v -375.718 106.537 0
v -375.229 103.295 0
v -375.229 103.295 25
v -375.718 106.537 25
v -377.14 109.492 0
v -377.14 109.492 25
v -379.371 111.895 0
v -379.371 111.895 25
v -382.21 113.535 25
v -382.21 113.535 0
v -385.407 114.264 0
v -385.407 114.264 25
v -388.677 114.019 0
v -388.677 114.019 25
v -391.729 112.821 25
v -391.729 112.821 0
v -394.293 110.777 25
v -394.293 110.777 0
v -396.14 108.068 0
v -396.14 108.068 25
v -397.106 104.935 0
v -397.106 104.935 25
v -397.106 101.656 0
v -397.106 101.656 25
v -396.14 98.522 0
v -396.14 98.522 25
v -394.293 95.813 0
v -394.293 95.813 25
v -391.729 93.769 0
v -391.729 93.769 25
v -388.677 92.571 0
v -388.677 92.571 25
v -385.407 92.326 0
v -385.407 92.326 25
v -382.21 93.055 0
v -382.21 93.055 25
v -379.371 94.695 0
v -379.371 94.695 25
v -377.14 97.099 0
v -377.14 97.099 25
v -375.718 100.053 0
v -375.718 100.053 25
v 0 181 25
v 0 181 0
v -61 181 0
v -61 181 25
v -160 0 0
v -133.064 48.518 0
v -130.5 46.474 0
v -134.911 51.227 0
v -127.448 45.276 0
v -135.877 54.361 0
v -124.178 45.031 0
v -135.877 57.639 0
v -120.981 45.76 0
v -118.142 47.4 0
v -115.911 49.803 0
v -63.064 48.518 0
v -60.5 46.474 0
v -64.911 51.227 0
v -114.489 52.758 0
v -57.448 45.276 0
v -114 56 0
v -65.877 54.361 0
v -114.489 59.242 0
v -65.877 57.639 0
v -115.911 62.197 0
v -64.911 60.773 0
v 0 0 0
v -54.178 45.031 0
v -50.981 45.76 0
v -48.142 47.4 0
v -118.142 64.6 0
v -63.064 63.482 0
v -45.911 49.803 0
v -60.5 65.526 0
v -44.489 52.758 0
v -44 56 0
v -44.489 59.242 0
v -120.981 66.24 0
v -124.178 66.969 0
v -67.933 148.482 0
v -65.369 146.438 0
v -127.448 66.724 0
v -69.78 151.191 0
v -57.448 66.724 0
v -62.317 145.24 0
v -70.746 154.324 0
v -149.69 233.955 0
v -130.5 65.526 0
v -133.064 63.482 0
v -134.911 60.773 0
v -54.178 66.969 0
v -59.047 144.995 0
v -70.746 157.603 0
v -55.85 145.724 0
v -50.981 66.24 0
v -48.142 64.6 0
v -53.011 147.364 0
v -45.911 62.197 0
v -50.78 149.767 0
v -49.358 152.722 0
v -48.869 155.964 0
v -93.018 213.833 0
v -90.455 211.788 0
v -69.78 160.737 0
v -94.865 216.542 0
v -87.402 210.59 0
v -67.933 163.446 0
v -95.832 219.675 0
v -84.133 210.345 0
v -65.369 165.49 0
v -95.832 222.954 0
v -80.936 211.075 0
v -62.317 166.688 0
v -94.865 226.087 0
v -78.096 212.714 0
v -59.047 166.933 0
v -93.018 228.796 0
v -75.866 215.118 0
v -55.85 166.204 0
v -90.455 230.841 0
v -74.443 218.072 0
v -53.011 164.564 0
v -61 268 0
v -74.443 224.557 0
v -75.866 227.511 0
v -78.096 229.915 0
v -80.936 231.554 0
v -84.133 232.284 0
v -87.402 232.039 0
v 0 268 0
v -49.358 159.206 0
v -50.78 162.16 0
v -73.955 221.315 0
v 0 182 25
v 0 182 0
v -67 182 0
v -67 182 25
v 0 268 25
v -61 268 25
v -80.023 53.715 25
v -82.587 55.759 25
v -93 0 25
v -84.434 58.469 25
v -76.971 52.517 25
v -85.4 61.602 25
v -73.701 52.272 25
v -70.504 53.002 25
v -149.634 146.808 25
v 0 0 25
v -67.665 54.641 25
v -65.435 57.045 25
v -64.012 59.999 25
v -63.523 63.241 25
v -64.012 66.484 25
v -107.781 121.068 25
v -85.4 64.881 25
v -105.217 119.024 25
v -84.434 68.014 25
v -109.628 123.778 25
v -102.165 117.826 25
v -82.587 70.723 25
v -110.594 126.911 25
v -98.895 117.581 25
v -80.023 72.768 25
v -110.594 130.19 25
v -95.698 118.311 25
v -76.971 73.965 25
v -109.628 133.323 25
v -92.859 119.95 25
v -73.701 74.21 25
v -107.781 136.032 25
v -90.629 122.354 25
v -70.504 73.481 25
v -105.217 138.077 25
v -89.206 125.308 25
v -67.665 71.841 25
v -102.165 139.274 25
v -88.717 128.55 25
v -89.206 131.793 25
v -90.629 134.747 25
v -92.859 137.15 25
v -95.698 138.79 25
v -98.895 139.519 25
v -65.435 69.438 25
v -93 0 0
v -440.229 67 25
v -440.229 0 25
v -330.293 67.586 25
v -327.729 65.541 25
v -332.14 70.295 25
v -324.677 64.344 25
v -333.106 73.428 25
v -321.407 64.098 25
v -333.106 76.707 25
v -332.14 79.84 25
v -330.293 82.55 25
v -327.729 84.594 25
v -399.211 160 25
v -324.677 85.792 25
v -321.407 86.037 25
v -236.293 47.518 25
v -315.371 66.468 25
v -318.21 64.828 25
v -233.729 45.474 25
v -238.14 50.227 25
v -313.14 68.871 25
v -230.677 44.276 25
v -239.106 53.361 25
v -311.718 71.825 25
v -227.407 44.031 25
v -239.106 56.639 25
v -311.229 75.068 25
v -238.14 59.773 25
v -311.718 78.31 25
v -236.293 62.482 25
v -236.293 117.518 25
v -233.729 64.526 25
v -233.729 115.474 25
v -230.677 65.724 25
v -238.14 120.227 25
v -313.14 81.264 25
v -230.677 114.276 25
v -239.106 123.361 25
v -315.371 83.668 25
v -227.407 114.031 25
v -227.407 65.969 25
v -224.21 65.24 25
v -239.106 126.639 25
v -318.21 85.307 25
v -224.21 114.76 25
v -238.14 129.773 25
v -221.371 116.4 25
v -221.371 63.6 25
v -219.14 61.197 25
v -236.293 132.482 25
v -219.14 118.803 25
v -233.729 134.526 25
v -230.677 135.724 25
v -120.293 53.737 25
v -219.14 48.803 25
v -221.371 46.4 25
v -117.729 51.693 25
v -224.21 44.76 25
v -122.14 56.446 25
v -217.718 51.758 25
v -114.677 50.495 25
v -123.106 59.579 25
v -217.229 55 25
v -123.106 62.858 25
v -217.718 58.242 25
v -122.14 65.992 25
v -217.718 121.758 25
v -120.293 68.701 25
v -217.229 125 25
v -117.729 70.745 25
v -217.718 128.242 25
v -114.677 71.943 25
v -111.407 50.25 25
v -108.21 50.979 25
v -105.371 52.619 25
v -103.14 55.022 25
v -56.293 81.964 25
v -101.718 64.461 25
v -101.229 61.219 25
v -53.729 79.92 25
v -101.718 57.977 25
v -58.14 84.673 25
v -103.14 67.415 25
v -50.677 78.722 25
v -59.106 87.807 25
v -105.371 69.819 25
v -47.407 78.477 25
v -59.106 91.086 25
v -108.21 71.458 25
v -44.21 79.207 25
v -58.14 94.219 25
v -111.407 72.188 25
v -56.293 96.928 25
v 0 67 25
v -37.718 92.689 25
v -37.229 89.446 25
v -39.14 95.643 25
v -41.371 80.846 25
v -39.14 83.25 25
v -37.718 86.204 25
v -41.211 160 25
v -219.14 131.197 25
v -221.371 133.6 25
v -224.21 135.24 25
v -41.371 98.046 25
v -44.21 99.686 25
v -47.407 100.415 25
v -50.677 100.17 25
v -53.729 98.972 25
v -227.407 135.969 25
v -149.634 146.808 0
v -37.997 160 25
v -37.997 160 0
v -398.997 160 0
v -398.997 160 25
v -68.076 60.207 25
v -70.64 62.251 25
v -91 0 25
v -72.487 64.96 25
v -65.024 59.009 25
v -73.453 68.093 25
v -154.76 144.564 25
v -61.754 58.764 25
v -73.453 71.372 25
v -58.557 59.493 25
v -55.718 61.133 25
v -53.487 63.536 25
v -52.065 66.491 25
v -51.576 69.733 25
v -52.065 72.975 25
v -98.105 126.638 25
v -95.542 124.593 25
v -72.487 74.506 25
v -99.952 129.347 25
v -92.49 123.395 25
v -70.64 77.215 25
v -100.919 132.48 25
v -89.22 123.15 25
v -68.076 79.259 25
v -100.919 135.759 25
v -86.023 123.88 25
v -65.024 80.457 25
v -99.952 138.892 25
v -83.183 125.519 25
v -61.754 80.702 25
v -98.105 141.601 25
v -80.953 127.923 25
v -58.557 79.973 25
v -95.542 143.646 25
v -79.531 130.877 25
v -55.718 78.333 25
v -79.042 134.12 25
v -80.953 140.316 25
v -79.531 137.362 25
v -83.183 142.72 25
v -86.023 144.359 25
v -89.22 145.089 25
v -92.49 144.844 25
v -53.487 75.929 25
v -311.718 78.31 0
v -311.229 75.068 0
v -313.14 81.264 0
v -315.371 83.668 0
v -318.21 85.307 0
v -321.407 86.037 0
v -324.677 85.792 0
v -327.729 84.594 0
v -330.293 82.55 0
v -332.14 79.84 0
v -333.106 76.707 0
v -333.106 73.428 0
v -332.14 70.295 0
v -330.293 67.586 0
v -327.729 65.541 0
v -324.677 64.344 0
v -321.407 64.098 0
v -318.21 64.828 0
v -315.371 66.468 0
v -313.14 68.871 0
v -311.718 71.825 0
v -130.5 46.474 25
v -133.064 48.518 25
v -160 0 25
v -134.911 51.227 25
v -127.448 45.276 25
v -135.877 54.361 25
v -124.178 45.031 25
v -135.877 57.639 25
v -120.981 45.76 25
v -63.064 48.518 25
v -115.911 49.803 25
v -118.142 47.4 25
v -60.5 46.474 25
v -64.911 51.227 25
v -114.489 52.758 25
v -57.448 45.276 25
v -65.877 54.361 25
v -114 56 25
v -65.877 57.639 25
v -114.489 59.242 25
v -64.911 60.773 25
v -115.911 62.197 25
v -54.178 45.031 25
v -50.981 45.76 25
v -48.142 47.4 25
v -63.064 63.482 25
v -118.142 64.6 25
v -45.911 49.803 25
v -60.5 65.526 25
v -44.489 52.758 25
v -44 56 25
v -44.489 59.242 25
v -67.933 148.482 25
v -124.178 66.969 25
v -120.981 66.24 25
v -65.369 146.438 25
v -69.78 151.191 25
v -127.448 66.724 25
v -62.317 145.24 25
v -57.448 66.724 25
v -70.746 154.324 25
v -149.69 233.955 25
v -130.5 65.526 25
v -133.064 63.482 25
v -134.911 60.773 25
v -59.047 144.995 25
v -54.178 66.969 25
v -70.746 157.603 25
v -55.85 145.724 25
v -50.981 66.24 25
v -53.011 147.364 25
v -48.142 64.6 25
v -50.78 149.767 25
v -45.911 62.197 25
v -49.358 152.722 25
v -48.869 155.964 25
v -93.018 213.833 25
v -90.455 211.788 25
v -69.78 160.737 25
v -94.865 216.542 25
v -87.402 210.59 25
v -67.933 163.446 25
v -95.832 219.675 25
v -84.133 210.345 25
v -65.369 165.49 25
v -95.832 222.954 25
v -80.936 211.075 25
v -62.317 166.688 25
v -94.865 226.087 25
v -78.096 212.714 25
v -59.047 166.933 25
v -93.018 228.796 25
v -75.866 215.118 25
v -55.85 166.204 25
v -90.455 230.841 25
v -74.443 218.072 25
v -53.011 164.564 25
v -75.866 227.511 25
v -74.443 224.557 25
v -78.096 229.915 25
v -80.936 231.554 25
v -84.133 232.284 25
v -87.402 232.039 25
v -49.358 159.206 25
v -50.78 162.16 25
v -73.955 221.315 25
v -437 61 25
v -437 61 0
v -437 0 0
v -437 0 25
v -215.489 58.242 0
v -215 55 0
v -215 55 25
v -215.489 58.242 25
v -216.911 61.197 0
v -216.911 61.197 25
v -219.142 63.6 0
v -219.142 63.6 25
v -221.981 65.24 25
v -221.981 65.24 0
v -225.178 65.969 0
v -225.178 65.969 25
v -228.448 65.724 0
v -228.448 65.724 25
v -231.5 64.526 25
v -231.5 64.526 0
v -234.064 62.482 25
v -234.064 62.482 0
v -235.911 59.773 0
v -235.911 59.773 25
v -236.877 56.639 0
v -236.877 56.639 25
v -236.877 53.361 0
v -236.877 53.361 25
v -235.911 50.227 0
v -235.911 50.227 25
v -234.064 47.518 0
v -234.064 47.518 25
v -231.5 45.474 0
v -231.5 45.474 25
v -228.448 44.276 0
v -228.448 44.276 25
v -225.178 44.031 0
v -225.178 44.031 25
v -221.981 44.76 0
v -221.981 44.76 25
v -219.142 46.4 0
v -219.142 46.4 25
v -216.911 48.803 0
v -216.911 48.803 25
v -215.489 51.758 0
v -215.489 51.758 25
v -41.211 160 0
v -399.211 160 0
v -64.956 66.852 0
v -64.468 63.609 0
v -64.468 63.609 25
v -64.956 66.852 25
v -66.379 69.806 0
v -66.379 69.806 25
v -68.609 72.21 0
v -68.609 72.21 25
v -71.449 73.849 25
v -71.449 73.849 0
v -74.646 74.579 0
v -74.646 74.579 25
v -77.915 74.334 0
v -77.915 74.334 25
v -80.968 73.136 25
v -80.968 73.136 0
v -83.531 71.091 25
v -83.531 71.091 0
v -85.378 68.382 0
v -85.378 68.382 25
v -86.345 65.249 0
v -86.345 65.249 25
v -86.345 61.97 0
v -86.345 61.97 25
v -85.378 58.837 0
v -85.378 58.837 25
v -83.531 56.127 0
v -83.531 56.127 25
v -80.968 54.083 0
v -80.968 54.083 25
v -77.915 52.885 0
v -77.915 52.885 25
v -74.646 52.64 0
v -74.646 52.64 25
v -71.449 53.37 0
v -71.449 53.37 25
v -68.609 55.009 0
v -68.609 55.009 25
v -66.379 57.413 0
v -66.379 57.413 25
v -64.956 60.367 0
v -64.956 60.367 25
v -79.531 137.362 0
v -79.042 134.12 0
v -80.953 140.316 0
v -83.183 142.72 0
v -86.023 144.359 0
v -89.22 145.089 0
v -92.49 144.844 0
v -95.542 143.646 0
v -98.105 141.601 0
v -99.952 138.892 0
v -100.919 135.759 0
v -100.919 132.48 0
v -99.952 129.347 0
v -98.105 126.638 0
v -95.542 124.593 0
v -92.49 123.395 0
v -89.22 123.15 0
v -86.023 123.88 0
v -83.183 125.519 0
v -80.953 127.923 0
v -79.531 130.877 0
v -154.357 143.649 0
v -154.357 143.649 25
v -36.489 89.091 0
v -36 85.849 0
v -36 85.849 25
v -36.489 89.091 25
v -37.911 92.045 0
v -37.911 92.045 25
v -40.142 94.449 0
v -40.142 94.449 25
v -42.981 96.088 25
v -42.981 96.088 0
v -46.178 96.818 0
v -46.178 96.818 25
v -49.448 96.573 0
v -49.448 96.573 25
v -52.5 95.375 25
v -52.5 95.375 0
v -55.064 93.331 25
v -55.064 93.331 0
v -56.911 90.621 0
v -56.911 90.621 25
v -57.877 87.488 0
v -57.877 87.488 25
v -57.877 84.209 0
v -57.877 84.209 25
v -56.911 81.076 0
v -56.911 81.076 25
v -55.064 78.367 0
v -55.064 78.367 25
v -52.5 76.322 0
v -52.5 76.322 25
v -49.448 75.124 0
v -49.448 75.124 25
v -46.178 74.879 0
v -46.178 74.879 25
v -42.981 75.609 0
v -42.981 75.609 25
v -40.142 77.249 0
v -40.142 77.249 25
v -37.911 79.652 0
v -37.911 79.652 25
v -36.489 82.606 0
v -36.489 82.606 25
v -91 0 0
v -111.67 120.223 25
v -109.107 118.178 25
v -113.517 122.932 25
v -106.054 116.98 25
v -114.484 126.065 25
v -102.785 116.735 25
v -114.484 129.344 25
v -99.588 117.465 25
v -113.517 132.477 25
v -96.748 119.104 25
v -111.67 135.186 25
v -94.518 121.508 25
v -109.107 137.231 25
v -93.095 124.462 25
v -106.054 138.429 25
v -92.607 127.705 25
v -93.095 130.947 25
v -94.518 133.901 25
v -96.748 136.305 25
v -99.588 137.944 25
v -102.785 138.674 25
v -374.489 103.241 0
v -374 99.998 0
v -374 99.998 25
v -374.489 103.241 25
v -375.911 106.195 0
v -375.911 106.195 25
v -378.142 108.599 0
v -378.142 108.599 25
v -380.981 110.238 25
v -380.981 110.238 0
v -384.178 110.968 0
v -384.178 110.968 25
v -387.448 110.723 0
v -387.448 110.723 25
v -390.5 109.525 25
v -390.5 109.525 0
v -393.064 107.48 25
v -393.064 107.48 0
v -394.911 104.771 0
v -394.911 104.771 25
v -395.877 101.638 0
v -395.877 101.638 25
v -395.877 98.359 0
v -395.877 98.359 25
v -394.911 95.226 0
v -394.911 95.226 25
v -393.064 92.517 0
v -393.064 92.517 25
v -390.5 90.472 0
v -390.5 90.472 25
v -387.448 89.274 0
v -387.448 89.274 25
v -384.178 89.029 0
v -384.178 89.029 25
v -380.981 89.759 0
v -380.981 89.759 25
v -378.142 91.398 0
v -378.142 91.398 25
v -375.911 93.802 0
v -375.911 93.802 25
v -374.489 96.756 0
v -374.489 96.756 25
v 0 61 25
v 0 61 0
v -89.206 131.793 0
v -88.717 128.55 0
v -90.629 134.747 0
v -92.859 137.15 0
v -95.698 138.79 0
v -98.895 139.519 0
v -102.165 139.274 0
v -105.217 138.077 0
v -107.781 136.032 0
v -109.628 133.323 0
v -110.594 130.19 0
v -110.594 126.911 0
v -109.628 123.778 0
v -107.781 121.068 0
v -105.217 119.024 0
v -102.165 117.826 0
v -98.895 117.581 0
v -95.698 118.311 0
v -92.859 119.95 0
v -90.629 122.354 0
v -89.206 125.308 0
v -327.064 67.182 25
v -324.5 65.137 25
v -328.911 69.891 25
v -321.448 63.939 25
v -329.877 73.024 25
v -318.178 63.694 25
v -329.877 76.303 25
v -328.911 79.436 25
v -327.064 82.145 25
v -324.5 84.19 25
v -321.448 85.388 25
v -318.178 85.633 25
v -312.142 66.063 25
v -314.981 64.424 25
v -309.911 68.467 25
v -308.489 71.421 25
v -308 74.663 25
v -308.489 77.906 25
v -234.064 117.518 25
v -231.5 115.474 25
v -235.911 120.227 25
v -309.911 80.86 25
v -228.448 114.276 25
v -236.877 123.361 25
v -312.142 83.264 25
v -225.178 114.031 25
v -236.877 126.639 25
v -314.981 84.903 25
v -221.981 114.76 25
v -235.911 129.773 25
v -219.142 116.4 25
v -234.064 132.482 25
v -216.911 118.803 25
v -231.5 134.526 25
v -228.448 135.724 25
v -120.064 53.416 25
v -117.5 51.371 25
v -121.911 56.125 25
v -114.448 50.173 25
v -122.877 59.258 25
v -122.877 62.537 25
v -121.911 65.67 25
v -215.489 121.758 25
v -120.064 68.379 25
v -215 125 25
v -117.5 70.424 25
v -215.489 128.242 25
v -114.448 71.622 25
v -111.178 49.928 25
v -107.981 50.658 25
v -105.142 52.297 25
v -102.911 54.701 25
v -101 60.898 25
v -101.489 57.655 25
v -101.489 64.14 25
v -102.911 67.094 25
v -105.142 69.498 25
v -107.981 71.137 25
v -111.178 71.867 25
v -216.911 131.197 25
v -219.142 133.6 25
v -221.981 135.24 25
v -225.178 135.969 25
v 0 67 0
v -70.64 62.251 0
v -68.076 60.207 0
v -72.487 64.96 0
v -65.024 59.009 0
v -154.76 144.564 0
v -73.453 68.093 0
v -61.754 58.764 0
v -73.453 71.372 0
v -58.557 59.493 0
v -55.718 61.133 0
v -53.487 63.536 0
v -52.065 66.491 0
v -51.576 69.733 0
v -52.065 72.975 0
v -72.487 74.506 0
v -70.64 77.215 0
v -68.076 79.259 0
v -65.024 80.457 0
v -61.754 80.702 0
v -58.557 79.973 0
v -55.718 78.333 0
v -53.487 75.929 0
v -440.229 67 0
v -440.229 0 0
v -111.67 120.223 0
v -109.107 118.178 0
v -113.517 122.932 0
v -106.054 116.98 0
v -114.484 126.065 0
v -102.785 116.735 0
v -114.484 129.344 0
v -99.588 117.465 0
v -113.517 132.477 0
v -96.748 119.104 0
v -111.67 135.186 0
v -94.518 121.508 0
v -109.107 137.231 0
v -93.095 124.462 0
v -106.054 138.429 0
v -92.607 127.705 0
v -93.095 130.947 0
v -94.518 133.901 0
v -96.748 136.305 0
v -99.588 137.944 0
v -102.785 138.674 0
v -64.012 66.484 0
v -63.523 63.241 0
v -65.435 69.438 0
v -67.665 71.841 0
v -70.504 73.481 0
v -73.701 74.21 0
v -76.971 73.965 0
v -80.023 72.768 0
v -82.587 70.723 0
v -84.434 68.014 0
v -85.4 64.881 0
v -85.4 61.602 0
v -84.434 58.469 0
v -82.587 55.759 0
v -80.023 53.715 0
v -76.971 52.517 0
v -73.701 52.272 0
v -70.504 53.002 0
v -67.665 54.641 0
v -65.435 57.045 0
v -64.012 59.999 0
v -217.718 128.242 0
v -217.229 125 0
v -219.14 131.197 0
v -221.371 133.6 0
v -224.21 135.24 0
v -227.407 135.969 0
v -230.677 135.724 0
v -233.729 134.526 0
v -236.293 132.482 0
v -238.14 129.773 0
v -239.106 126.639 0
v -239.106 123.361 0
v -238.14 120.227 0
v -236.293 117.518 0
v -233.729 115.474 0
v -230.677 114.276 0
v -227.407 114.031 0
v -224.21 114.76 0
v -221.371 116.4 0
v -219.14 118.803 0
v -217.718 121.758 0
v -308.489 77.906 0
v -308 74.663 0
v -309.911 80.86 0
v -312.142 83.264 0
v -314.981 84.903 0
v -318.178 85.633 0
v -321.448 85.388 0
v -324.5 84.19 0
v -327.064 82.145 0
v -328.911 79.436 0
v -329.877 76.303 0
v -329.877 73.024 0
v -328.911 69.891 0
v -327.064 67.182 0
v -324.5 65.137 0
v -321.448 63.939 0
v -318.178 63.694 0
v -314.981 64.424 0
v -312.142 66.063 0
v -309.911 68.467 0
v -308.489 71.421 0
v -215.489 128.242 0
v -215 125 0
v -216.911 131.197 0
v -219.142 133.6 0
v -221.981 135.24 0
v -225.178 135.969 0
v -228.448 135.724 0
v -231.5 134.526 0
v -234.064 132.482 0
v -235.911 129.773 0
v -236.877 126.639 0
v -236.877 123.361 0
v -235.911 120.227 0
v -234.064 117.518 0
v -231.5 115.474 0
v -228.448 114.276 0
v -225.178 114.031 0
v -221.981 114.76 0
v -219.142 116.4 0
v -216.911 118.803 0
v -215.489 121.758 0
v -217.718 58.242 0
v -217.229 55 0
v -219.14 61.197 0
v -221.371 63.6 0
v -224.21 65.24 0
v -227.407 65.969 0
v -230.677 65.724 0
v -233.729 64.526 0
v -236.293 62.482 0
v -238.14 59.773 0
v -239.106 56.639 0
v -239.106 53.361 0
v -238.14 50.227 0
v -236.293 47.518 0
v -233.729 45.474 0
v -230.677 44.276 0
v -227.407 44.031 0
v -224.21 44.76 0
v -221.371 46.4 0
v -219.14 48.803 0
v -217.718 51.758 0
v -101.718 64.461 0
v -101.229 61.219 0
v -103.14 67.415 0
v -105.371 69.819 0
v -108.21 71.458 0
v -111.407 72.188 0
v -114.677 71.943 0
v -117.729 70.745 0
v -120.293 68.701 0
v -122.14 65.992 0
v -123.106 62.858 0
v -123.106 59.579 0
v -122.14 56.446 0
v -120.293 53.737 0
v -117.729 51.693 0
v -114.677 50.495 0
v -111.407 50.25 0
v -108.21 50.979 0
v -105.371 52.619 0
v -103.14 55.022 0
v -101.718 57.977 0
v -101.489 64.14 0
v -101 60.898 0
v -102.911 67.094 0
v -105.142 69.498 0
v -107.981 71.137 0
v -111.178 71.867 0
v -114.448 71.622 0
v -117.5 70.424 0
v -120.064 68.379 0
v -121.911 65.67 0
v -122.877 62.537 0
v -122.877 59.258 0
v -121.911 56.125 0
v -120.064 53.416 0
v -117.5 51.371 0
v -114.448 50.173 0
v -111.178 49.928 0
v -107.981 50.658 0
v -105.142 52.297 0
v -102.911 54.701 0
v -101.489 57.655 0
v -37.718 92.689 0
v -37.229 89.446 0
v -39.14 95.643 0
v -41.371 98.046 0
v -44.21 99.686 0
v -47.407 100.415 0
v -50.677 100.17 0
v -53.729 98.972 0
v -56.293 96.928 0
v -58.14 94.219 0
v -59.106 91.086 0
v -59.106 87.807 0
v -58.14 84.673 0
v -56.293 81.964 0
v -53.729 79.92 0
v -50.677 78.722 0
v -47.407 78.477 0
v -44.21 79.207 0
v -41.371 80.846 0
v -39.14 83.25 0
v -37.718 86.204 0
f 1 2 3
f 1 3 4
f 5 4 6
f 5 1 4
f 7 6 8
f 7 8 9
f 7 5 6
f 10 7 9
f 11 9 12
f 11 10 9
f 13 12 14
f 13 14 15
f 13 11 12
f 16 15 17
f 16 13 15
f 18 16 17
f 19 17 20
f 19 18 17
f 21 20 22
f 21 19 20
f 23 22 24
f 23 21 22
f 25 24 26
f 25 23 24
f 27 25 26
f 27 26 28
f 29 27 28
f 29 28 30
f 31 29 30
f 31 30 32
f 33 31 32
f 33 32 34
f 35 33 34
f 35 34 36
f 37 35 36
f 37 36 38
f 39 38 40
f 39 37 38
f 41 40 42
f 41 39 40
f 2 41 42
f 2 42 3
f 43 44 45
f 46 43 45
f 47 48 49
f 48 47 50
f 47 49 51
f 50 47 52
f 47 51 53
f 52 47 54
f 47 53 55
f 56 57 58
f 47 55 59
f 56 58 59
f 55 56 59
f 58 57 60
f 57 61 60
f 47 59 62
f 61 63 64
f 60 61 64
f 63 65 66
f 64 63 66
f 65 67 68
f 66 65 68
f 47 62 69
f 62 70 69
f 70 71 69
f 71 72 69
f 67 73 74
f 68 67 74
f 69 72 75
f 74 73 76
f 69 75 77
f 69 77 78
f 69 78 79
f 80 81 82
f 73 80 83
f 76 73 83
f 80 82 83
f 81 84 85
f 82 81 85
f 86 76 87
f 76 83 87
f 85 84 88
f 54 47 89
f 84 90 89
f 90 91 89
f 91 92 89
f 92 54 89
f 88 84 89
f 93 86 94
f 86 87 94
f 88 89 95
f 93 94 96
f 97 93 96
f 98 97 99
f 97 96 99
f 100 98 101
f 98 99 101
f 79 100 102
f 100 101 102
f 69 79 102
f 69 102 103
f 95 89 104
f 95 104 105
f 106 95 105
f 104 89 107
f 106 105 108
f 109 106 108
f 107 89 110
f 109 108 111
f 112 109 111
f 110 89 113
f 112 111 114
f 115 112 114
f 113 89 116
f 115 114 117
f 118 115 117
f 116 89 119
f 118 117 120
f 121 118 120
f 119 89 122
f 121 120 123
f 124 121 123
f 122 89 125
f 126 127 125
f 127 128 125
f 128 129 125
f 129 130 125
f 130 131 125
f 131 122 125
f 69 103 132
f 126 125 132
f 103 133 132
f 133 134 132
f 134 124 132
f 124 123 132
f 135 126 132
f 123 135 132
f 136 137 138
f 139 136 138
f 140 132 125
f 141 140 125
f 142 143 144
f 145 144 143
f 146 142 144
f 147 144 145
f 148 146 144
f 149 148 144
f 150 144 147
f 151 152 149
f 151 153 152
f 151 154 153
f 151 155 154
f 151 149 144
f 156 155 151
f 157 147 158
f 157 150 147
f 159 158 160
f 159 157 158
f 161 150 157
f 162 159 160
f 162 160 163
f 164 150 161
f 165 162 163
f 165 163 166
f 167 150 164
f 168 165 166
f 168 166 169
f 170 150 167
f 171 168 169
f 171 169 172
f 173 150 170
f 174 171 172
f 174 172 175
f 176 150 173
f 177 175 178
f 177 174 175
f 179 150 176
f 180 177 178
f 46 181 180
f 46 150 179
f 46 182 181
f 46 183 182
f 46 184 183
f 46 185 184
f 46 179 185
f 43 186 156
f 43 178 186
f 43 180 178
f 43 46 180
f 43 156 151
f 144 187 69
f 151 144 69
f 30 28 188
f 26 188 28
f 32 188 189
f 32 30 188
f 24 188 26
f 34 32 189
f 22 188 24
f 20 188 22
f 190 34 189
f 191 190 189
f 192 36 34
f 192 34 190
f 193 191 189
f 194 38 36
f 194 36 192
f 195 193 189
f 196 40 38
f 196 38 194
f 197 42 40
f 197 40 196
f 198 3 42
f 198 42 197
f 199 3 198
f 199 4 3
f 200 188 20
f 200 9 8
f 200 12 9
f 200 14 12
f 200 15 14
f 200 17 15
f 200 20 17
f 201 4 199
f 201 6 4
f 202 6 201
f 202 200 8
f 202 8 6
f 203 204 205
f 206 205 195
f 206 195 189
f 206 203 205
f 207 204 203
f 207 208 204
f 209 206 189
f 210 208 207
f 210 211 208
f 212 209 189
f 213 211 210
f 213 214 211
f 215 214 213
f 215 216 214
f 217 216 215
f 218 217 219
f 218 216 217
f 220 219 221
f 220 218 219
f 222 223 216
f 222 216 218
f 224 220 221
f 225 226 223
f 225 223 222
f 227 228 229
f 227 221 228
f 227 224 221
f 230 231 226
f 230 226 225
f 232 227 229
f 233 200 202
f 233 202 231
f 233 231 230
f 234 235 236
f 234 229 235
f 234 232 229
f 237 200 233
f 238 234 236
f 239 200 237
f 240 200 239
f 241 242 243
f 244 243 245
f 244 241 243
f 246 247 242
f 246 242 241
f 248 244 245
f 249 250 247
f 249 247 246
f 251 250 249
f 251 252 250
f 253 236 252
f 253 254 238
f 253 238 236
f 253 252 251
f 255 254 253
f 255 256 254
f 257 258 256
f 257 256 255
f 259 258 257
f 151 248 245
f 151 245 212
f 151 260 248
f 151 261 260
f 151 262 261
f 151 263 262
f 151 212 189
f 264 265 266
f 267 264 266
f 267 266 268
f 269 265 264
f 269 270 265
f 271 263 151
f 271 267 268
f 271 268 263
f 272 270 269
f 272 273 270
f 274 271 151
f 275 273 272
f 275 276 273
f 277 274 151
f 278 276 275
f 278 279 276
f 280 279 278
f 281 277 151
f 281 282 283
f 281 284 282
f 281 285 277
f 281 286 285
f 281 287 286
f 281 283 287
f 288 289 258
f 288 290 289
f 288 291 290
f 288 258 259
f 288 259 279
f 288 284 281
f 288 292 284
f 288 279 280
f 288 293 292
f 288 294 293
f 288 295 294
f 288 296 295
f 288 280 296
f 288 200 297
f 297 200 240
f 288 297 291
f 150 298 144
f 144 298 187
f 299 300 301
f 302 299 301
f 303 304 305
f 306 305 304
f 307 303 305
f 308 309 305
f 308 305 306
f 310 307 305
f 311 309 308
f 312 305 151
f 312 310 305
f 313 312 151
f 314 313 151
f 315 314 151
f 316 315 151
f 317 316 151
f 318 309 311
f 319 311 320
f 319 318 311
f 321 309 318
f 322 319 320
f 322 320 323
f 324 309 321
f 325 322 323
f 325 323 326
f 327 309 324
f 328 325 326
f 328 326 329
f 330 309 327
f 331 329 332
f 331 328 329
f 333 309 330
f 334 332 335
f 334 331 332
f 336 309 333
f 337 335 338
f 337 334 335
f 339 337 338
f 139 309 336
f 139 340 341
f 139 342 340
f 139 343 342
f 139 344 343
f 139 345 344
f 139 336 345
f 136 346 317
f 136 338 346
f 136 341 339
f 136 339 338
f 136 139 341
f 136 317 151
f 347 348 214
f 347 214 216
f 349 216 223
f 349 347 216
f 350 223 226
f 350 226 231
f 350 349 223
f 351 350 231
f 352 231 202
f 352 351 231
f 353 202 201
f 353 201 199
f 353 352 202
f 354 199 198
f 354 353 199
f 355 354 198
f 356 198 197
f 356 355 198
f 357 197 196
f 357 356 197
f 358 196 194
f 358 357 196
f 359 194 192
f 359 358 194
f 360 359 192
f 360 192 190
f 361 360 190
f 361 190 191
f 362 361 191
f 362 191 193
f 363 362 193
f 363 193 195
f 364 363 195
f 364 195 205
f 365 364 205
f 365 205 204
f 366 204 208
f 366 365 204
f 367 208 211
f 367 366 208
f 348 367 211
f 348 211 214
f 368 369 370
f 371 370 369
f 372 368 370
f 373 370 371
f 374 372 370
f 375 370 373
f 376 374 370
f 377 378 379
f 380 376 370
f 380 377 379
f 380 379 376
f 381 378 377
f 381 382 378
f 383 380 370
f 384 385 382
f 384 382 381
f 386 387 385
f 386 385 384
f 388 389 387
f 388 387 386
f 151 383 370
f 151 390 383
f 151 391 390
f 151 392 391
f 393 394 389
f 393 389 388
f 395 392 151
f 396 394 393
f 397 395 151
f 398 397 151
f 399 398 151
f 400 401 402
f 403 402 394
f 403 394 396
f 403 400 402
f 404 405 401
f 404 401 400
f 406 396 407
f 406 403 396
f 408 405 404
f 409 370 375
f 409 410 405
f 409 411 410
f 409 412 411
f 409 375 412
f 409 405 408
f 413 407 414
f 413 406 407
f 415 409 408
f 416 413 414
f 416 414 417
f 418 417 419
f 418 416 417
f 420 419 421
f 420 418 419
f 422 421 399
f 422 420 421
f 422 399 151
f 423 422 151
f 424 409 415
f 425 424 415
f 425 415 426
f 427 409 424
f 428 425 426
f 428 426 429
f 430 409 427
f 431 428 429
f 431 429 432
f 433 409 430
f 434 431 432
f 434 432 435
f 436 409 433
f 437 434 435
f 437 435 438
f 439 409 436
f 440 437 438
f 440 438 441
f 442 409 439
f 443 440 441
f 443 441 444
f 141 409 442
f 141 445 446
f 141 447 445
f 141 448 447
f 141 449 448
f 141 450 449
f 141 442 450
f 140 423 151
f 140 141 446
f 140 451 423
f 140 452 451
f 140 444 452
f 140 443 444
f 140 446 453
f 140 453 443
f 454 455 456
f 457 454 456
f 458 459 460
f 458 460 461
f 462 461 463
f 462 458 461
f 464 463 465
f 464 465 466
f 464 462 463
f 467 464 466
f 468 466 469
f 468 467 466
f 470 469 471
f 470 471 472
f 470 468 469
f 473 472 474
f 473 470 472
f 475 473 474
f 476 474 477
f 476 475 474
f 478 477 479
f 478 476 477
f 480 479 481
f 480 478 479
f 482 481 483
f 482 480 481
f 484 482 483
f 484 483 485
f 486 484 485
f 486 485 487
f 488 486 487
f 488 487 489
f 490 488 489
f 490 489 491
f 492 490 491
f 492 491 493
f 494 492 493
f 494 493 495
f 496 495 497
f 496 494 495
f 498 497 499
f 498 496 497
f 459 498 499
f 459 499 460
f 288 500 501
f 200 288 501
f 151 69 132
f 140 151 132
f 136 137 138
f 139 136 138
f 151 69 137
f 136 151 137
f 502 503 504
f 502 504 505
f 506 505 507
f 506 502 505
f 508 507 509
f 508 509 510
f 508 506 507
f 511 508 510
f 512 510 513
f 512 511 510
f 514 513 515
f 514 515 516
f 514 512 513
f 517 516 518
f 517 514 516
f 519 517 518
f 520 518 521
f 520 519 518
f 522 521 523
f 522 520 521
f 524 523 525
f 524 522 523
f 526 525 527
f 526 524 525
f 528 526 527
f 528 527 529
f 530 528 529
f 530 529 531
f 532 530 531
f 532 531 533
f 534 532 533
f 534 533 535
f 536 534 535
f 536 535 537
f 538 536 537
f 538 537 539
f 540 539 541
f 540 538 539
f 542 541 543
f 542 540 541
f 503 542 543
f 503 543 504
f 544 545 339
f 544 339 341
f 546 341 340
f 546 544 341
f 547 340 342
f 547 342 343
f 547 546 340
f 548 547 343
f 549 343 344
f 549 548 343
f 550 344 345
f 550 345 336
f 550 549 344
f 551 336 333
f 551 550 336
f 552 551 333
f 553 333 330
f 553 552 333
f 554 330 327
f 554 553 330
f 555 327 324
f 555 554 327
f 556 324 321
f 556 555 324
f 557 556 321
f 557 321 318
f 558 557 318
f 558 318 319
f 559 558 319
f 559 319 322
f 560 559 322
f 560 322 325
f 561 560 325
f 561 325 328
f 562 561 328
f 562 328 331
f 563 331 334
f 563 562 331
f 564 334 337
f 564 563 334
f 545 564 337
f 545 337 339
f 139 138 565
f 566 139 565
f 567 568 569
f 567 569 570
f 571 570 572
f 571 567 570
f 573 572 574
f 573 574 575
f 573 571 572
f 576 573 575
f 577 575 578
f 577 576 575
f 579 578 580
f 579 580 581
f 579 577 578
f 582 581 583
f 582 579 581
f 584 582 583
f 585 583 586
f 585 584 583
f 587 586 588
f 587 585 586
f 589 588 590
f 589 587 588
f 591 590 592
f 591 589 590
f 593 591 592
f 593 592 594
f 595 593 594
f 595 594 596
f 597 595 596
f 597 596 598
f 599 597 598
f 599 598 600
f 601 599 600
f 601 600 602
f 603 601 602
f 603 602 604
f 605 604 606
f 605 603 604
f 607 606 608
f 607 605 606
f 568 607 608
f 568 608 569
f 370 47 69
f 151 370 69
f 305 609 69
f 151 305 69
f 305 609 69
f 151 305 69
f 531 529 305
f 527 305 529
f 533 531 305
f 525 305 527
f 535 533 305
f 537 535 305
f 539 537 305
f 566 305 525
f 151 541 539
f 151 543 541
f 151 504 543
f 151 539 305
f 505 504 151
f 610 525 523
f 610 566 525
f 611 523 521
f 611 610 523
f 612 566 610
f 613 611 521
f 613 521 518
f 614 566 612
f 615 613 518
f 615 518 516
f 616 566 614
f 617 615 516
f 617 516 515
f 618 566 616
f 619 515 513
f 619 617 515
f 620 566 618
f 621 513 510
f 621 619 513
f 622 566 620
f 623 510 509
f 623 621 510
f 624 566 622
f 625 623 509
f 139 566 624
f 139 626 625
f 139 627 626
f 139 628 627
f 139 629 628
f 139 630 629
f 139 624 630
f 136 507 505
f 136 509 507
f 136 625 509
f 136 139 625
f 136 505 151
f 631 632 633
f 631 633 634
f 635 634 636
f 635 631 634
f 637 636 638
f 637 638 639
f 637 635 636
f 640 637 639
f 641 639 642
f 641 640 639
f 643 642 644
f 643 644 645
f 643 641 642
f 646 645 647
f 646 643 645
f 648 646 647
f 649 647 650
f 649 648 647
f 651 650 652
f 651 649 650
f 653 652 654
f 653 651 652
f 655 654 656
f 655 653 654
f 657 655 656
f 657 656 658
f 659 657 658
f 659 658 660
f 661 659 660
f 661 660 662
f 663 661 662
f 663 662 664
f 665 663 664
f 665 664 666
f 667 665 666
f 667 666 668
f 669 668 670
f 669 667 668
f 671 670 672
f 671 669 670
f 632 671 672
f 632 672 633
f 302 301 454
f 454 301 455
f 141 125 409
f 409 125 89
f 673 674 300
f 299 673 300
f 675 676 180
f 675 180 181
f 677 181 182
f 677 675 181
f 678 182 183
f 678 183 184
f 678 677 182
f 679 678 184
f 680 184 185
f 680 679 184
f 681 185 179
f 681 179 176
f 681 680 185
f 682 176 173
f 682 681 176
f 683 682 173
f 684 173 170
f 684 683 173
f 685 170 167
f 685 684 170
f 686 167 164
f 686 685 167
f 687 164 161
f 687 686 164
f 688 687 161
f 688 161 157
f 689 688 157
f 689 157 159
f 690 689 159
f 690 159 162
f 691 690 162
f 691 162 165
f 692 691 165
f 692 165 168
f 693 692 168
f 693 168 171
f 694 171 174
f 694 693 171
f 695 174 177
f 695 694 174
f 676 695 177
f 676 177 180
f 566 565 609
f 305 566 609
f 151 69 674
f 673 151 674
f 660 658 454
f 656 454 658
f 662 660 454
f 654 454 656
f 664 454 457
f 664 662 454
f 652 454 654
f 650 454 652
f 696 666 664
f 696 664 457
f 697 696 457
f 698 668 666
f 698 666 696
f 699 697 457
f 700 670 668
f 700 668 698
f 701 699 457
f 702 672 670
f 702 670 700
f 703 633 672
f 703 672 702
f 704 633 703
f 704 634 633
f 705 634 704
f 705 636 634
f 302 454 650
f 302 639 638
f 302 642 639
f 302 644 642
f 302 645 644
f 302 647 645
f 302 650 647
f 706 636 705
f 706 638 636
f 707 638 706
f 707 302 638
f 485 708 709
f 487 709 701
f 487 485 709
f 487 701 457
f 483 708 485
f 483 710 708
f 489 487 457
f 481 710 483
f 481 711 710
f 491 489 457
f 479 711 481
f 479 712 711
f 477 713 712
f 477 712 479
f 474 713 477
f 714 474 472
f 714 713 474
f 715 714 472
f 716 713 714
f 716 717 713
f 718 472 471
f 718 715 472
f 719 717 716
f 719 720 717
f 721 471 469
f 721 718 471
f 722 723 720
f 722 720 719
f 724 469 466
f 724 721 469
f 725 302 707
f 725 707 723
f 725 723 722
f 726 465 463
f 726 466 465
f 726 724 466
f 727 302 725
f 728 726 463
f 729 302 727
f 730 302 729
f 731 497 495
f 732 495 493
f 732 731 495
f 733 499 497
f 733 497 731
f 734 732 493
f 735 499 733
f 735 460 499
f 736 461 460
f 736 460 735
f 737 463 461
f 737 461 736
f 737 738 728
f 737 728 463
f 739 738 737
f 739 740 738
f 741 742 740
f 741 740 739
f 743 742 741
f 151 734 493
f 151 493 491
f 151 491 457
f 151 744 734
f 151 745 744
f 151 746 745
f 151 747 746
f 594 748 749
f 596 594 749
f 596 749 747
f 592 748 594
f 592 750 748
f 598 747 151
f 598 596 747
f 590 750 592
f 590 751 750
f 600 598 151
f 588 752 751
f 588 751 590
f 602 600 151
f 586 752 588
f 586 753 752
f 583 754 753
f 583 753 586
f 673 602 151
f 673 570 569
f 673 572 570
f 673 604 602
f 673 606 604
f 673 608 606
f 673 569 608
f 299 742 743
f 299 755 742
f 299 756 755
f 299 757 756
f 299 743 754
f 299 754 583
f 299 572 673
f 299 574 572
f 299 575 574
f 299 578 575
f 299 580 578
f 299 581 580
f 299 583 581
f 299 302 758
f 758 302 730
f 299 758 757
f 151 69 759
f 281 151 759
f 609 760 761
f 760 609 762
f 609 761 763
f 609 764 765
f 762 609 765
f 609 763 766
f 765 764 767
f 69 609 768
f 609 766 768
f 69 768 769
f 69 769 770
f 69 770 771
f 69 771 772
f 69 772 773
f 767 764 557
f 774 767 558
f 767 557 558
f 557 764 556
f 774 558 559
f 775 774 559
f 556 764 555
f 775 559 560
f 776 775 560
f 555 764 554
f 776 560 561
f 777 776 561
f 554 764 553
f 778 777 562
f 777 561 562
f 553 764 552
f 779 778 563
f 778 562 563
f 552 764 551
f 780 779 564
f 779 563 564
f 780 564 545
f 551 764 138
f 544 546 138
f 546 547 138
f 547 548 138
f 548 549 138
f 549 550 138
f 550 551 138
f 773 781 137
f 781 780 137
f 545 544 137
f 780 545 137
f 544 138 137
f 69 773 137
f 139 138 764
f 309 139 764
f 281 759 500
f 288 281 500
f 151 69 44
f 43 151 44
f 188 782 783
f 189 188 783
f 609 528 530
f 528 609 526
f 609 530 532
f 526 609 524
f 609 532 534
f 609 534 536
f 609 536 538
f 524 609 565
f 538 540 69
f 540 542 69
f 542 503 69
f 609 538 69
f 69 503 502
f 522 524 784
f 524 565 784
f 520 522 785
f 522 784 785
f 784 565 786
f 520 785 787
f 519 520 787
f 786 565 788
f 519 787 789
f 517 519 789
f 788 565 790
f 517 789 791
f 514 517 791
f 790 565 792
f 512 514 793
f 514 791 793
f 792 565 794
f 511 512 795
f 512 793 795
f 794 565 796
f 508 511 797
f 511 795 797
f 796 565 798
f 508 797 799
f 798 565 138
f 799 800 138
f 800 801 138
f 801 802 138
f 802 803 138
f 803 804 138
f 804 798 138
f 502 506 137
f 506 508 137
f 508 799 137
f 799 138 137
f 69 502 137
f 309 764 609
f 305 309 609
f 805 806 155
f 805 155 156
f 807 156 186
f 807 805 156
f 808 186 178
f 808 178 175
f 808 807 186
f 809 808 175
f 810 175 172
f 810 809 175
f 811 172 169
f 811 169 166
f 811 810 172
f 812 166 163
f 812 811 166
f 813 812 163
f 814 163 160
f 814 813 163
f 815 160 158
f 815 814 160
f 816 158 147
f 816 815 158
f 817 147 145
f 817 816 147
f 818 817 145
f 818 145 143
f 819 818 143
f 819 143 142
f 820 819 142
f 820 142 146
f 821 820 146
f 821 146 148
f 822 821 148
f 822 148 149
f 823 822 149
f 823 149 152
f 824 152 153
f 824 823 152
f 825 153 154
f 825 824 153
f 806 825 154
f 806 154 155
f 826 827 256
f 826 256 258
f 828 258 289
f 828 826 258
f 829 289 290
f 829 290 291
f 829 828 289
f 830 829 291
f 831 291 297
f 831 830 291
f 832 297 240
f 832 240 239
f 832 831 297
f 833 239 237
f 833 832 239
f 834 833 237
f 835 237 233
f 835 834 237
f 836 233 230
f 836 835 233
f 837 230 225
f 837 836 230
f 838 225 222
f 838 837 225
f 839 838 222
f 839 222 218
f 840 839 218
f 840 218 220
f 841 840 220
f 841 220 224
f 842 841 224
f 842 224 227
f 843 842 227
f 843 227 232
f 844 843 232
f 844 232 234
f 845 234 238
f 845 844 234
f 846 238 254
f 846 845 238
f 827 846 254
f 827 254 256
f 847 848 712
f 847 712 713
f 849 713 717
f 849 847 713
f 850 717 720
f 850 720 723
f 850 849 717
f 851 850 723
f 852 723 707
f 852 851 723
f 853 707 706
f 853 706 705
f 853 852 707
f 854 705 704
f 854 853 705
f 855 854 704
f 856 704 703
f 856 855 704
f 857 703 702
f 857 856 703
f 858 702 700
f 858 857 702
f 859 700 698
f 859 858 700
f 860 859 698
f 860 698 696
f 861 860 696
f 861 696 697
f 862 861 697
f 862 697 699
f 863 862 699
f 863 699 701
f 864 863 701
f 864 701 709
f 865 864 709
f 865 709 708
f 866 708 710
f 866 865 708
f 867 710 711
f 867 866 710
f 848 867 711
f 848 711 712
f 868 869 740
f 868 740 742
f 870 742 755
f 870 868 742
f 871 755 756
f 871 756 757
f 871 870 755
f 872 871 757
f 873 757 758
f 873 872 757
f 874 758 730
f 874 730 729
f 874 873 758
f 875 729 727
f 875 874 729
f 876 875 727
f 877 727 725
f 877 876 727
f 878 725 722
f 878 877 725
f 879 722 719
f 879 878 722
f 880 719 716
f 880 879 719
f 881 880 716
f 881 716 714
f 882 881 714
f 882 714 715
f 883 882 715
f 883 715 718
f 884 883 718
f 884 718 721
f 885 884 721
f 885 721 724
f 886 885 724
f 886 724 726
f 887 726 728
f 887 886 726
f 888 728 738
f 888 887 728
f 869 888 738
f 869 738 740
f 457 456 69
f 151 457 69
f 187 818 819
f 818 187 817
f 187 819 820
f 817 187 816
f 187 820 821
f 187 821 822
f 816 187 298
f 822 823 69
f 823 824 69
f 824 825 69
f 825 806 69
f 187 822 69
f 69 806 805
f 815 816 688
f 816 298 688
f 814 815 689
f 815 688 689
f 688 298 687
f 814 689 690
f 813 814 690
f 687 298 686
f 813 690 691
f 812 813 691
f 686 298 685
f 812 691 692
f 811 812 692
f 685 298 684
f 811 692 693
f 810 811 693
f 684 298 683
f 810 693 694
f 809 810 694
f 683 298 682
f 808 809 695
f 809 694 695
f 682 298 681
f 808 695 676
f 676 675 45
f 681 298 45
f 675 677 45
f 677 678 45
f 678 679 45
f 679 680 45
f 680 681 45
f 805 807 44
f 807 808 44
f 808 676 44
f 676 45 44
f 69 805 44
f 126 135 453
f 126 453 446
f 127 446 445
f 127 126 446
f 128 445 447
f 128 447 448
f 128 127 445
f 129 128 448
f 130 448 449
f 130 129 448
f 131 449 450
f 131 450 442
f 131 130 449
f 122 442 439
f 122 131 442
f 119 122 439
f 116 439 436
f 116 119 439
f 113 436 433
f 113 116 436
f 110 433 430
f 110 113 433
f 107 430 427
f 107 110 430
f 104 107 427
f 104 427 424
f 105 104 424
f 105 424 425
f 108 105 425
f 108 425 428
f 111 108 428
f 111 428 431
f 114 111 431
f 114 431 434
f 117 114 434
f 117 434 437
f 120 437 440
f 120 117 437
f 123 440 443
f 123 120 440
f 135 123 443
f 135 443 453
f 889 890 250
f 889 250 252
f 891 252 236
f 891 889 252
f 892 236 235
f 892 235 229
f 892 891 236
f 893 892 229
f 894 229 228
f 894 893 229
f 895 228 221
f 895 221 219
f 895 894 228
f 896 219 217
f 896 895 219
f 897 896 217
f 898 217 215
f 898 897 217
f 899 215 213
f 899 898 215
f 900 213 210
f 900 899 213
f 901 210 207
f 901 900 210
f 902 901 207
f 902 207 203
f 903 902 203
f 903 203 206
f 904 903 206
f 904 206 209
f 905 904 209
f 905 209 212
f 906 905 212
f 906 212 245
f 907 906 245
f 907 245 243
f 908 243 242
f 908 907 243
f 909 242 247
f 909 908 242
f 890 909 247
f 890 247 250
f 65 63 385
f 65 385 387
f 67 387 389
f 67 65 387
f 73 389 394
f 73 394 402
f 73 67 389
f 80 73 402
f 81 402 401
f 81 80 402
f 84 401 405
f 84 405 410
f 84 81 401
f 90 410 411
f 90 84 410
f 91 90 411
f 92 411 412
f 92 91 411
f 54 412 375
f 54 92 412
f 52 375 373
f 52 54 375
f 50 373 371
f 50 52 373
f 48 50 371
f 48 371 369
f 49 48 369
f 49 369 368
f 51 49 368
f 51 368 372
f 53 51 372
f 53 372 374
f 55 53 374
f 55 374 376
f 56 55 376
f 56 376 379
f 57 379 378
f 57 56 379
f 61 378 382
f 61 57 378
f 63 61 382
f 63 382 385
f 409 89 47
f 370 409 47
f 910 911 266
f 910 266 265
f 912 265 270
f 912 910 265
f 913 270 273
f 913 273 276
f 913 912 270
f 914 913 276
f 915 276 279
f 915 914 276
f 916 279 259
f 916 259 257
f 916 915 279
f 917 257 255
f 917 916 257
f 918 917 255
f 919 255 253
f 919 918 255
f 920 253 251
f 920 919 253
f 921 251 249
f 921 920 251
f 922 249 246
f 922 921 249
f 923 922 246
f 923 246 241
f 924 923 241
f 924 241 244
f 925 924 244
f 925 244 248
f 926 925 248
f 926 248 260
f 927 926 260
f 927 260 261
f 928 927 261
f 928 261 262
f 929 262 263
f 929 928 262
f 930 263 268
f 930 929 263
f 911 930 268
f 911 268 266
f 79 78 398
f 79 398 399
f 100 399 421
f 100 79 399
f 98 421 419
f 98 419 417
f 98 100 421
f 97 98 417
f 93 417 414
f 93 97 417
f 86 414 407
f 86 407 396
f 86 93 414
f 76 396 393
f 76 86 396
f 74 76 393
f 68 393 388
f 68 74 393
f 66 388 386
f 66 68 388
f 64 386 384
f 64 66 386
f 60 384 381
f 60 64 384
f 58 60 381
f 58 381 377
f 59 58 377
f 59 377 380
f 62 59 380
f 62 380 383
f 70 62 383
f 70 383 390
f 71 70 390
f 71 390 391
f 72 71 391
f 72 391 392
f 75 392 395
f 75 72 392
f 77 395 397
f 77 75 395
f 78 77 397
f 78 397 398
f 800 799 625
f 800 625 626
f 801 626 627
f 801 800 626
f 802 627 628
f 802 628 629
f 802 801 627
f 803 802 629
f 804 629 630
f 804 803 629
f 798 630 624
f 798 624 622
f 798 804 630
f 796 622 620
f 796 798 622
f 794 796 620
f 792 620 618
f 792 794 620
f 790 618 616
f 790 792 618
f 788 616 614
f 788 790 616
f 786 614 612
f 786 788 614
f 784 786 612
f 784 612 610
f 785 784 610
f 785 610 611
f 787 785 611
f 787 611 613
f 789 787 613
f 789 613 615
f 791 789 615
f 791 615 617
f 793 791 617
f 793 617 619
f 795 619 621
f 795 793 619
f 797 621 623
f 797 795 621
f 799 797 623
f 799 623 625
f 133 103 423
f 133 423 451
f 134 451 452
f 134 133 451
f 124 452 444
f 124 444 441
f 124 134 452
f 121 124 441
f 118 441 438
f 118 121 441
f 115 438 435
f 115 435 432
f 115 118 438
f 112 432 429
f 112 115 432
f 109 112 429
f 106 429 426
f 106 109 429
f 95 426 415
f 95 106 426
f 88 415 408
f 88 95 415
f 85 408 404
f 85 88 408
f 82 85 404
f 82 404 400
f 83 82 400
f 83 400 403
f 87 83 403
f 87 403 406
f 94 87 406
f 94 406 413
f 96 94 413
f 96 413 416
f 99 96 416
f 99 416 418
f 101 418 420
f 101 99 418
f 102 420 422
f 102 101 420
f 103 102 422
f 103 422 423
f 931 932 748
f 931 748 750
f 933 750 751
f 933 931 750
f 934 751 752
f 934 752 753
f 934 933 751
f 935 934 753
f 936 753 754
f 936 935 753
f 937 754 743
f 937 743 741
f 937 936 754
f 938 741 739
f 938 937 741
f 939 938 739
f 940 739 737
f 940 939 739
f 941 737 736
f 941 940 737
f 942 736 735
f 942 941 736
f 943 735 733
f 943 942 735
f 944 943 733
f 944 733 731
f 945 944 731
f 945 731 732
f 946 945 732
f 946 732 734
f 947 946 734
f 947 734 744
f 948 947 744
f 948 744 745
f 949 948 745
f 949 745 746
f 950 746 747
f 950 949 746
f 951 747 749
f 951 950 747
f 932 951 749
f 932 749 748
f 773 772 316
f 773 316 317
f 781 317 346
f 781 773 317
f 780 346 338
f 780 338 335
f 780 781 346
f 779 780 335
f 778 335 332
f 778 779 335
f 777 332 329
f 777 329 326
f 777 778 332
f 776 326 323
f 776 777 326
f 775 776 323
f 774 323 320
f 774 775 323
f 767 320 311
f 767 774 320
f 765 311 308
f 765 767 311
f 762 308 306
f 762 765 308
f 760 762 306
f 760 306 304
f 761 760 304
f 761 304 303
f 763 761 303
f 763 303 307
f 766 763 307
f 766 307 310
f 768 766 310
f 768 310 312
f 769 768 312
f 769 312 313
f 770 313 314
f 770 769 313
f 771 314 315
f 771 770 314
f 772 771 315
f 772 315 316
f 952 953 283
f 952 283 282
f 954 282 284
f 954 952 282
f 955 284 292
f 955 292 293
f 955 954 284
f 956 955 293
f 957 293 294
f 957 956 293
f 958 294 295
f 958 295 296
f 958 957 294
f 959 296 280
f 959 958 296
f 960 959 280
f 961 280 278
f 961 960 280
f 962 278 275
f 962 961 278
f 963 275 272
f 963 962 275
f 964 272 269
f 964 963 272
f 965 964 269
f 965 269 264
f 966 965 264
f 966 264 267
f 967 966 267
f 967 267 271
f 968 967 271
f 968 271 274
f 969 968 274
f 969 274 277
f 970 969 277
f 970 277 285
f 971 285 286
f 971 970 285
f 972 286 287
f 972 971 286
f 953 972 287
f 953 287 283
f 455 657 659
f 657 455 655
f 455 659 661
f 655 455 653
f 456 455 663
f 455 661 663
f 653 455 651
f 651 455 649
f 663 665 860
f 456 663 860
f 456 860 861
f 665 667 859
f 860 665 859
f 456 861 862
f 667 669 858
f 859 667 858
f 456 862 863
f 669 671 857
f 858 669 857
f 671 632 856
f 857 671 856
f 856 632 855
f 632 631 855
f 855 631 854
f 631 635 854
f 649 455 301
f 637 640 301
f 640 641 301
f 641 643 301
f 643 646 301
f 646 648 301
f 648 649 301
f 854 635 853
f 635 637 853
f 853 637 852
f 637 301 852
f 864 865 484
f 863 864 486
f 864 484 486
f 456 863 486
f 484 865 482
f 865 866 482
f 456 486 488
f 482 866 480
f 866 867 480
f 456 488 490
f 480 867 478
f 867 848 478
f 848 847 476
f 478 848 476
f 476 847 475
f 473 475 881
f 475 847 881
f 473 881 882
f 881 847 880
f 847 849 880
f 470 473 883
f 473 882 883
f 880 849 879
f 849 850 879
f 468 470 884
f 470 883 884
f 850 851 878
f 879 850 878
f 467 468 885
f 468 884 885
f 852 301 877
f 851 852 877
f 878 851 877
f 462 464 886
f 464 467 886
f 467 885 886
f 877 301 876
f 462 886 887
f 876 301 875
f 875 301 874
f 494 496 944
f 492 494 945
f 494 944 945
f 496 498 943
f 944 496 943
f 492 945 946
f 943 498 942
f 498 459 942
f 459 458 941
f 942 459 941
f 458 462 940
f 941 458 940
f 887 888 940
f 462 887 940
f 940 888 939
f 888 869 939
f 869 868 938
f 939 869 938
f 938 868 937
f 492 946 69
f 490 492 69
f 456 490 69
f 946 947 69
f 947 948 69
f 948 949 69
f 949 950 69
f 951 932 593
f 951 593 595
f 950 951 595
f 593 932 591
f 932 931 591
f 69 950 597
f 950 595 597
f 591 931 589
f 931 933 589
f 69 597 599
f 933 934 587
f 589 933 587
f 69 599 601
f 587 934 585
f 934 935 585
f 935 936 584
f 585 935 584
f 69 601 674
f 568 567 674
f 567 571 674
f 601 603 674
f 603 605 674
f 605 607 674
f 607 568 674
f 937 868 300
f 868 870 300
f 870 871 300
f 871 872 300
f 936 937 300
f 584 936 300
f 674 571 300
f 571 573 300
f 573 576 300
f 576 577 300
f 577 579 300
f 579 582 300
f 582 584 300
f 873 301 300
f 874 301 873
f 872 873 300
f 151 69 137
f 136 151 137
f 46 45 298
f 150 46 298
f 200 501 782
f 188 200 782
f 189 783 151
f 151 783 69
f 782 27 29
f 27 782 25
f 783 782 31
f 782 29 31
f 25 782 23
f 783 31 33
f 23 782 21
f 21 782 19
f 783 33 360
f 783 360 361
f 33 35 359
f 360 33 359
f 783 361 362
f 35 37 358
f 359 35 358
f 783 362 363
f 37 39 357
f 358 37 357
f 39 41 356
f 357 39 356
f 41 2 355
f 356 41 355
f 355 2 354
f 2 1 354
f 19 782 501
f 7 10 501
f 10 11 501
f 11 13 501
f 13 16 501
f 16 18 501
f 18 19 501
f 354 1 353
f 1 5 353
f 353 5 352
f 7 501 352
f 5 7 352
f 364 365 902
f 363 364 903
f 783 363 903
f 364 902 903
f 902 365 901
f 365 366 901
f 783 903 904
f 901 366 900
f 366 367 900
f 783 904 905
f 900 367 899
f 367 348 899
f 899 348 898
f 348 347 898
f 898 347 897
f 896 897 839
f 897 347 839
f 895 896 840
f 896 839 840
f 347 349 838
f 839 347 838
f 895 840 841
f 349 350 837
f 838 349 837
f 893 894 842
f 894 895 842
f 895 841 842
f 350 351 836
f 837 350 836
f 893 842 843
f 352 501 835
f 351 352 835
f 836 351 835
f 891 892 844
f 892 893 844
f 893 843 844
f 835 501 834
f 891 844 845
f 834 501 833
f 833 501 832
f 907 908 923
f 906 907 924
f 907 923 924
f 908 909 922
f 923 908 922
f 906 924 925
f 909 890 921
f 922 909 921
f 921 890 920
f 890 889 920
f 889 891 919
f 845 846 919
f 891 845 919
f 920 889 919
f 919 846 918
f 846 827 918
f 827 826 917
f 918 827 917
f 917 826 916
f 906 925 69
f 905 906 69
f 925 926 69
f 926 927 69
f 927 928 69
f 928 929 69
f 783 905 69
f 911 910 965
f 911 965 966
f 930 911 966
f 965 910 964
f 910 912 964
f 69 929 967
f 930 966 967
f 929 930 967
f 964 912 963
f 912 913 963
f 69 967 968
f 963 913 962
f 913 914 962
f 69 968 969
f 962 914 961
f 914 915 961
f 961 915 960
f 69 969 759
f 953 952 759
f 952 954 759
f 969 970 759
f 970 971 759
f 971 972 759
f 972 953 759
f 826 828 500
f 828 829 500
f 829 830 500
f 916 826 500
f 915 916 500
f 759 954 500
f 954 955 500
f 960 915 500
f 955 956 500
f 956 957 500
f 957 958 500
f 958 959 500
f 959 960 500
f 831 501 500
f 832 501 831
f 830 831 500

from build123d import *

# Parameters (mm, degrees)
F0_R      = 11
F1_DEPTH  = 25
F2_R      = 11
F3_DEPTH  = 25
F4_R      = 11
F5_DEPTH  = 25
F6_R      = 11
F7_DEPTH  = 25
F8_R      = 11
F9_DEPTH  = 25
F10_R     = 11
F11_DEPTH = 25


with BuildPart() as f1:
    # F0 (on Top) → F1 (new body)
    with BuildSketch(Plane.XY):
        Polygon((-160, 0), (0, 0), (0, 268), (-61, 268), (-149.690141, 233.955045), align=None)
        with Locations((-125, 56)):
            Circle(F0_R, mode=Mode.SUBTRACT)
        with Locations((-55, 56)):
            Circle(F0_R, mode=Mode.SUBTRACT)
        with Locations((-84.954706, 221.314575)):
            Circle(F0_R, mode=Mode.SUBTRACT)
        with Locations((-59.868949, 155.963945)):
            Circle(F0_R, mode=Mode.SUBTRACT)
    extrude(amount=F1_DEPTH)


with BuildPart() as f3:
    # F2 (on Top) → F3 (new body)
    with BuildSketch(Plane.XY):
        Polygon((-93, 0), (0, 0), (0, 181), (-61, 181), (-149.633614, 146.808153), align=None)
        with Locations((-74.523209, 63.241252)):
            Circle(F2_R, mode=Mode.SUBTRACT)
        with Locations((-99.717201, 128.550231)):
            Circle(F2_R, mode=Mode.SUBTRACT)
    extrude(amount=F3_DEPTH)


with BuildPart() as f5:
    # F4 (on Top) → F5 (new body)
    with BuildSketch(Plane.XY):
        Polygon((-437, 0), (0, 0), (0, 61), (-37.997461, 160), (-398.997461, 160), (-437, 61), align=None)
        with Locations((-226, 55)):
            Circle(F4_R, mode=Mode.SUBTRACT)
        with Locations((-319, 74.663457)):
            Circle(F4_R, mode=Mode.SUBTRACT)
        with Locations((-112, 60.897517)):
            Circle(F4_R, mode=Mode.SUBTRACT)
        with Locations((-385, 99.998484)):
            Circle(F4_R, mode=Mode.SUBTRACT)
        with Locations((-226, 125)):
            Circle(F4_R, mode=Mode.SUBTRACT)
        with Locations((-47, 85.848679)):
            Circle(F4_R, mode=Mode.SUBTRACT)
    extrude(amount=F5_DEPTH)


with BuildPart() as f7:
    # F6 (on Top) → F7 (new body)
    with BuildSketch(Plane.XY):
        Polygon((-91, 0), (0, 0), (0, 182), (-67, 182), (-154.760157, 144.563628), align=None)
        with Locations((-62.576046, 69.732929)):
            Circle(F6_R, mode=Mode.SUBTRACT)
        with Locations((-90.041812, 134.119509)):
            Circle(F6_R, mode=Mode.SUBTRACT)
    extrude(amount=F7_DEPTH)


with BuildPart() as f9:
    # F8 (on Top) → F9 (new body)
    with BuildSketch(Plane.XY):
        Polygon((-91, 0), (0, 0), (0, 182), (-67, 182), (-154.356612, 143.648668), align=None)
        with Locations((-75.467549, 63.609359)):
            Circle(F8_R, mode=Mode.SUBTRACT)
        with Locations((-103.606637, 127.704535)):
            Circle(F8_R, mode=Mode.SUBTRACT)
    extrude(amount=F9_DEPTH)


with BuildPart() as f11:
    # F10 (on Top) → F11 (new body)
    with BuildSketch(Plane.XY):
        Polygon((-440.229085, 0), (0, 0), (0, 67), (-41.211198, 160), (-399.211198, 160), (-440.229085, 67), align=None)
        with Locations((-228.229085, 55)):
            Circle(F10_R, mode=Mode.SUBTRACT)
        with Locations((-322.229085, 75.067738)):
            Circle(F10_R, mode=Mode.SUBTRACT)
        with Locations((-112.229085, 61.21885)):
            Circle(F10_R, mode=Mode.SUBTRACT)
        with Locations((-386.229085, 103.295101)):
            Circle(F10_R, mode=Mode.SUBTRACT)
        with Locations((-228.229085, 125)):
            Circle(F10_R, mode=Mode.SUBTRACT)
        with Locations((-48.229085, 89.446213)):
            Circle(F10_R, mode=Mode.SUBTRACT)
    extrude(amount=F11_DEPTH)


solid = Compound([f1.part, f3.part, f5.part, f7.part, f9.part, f11.part])
